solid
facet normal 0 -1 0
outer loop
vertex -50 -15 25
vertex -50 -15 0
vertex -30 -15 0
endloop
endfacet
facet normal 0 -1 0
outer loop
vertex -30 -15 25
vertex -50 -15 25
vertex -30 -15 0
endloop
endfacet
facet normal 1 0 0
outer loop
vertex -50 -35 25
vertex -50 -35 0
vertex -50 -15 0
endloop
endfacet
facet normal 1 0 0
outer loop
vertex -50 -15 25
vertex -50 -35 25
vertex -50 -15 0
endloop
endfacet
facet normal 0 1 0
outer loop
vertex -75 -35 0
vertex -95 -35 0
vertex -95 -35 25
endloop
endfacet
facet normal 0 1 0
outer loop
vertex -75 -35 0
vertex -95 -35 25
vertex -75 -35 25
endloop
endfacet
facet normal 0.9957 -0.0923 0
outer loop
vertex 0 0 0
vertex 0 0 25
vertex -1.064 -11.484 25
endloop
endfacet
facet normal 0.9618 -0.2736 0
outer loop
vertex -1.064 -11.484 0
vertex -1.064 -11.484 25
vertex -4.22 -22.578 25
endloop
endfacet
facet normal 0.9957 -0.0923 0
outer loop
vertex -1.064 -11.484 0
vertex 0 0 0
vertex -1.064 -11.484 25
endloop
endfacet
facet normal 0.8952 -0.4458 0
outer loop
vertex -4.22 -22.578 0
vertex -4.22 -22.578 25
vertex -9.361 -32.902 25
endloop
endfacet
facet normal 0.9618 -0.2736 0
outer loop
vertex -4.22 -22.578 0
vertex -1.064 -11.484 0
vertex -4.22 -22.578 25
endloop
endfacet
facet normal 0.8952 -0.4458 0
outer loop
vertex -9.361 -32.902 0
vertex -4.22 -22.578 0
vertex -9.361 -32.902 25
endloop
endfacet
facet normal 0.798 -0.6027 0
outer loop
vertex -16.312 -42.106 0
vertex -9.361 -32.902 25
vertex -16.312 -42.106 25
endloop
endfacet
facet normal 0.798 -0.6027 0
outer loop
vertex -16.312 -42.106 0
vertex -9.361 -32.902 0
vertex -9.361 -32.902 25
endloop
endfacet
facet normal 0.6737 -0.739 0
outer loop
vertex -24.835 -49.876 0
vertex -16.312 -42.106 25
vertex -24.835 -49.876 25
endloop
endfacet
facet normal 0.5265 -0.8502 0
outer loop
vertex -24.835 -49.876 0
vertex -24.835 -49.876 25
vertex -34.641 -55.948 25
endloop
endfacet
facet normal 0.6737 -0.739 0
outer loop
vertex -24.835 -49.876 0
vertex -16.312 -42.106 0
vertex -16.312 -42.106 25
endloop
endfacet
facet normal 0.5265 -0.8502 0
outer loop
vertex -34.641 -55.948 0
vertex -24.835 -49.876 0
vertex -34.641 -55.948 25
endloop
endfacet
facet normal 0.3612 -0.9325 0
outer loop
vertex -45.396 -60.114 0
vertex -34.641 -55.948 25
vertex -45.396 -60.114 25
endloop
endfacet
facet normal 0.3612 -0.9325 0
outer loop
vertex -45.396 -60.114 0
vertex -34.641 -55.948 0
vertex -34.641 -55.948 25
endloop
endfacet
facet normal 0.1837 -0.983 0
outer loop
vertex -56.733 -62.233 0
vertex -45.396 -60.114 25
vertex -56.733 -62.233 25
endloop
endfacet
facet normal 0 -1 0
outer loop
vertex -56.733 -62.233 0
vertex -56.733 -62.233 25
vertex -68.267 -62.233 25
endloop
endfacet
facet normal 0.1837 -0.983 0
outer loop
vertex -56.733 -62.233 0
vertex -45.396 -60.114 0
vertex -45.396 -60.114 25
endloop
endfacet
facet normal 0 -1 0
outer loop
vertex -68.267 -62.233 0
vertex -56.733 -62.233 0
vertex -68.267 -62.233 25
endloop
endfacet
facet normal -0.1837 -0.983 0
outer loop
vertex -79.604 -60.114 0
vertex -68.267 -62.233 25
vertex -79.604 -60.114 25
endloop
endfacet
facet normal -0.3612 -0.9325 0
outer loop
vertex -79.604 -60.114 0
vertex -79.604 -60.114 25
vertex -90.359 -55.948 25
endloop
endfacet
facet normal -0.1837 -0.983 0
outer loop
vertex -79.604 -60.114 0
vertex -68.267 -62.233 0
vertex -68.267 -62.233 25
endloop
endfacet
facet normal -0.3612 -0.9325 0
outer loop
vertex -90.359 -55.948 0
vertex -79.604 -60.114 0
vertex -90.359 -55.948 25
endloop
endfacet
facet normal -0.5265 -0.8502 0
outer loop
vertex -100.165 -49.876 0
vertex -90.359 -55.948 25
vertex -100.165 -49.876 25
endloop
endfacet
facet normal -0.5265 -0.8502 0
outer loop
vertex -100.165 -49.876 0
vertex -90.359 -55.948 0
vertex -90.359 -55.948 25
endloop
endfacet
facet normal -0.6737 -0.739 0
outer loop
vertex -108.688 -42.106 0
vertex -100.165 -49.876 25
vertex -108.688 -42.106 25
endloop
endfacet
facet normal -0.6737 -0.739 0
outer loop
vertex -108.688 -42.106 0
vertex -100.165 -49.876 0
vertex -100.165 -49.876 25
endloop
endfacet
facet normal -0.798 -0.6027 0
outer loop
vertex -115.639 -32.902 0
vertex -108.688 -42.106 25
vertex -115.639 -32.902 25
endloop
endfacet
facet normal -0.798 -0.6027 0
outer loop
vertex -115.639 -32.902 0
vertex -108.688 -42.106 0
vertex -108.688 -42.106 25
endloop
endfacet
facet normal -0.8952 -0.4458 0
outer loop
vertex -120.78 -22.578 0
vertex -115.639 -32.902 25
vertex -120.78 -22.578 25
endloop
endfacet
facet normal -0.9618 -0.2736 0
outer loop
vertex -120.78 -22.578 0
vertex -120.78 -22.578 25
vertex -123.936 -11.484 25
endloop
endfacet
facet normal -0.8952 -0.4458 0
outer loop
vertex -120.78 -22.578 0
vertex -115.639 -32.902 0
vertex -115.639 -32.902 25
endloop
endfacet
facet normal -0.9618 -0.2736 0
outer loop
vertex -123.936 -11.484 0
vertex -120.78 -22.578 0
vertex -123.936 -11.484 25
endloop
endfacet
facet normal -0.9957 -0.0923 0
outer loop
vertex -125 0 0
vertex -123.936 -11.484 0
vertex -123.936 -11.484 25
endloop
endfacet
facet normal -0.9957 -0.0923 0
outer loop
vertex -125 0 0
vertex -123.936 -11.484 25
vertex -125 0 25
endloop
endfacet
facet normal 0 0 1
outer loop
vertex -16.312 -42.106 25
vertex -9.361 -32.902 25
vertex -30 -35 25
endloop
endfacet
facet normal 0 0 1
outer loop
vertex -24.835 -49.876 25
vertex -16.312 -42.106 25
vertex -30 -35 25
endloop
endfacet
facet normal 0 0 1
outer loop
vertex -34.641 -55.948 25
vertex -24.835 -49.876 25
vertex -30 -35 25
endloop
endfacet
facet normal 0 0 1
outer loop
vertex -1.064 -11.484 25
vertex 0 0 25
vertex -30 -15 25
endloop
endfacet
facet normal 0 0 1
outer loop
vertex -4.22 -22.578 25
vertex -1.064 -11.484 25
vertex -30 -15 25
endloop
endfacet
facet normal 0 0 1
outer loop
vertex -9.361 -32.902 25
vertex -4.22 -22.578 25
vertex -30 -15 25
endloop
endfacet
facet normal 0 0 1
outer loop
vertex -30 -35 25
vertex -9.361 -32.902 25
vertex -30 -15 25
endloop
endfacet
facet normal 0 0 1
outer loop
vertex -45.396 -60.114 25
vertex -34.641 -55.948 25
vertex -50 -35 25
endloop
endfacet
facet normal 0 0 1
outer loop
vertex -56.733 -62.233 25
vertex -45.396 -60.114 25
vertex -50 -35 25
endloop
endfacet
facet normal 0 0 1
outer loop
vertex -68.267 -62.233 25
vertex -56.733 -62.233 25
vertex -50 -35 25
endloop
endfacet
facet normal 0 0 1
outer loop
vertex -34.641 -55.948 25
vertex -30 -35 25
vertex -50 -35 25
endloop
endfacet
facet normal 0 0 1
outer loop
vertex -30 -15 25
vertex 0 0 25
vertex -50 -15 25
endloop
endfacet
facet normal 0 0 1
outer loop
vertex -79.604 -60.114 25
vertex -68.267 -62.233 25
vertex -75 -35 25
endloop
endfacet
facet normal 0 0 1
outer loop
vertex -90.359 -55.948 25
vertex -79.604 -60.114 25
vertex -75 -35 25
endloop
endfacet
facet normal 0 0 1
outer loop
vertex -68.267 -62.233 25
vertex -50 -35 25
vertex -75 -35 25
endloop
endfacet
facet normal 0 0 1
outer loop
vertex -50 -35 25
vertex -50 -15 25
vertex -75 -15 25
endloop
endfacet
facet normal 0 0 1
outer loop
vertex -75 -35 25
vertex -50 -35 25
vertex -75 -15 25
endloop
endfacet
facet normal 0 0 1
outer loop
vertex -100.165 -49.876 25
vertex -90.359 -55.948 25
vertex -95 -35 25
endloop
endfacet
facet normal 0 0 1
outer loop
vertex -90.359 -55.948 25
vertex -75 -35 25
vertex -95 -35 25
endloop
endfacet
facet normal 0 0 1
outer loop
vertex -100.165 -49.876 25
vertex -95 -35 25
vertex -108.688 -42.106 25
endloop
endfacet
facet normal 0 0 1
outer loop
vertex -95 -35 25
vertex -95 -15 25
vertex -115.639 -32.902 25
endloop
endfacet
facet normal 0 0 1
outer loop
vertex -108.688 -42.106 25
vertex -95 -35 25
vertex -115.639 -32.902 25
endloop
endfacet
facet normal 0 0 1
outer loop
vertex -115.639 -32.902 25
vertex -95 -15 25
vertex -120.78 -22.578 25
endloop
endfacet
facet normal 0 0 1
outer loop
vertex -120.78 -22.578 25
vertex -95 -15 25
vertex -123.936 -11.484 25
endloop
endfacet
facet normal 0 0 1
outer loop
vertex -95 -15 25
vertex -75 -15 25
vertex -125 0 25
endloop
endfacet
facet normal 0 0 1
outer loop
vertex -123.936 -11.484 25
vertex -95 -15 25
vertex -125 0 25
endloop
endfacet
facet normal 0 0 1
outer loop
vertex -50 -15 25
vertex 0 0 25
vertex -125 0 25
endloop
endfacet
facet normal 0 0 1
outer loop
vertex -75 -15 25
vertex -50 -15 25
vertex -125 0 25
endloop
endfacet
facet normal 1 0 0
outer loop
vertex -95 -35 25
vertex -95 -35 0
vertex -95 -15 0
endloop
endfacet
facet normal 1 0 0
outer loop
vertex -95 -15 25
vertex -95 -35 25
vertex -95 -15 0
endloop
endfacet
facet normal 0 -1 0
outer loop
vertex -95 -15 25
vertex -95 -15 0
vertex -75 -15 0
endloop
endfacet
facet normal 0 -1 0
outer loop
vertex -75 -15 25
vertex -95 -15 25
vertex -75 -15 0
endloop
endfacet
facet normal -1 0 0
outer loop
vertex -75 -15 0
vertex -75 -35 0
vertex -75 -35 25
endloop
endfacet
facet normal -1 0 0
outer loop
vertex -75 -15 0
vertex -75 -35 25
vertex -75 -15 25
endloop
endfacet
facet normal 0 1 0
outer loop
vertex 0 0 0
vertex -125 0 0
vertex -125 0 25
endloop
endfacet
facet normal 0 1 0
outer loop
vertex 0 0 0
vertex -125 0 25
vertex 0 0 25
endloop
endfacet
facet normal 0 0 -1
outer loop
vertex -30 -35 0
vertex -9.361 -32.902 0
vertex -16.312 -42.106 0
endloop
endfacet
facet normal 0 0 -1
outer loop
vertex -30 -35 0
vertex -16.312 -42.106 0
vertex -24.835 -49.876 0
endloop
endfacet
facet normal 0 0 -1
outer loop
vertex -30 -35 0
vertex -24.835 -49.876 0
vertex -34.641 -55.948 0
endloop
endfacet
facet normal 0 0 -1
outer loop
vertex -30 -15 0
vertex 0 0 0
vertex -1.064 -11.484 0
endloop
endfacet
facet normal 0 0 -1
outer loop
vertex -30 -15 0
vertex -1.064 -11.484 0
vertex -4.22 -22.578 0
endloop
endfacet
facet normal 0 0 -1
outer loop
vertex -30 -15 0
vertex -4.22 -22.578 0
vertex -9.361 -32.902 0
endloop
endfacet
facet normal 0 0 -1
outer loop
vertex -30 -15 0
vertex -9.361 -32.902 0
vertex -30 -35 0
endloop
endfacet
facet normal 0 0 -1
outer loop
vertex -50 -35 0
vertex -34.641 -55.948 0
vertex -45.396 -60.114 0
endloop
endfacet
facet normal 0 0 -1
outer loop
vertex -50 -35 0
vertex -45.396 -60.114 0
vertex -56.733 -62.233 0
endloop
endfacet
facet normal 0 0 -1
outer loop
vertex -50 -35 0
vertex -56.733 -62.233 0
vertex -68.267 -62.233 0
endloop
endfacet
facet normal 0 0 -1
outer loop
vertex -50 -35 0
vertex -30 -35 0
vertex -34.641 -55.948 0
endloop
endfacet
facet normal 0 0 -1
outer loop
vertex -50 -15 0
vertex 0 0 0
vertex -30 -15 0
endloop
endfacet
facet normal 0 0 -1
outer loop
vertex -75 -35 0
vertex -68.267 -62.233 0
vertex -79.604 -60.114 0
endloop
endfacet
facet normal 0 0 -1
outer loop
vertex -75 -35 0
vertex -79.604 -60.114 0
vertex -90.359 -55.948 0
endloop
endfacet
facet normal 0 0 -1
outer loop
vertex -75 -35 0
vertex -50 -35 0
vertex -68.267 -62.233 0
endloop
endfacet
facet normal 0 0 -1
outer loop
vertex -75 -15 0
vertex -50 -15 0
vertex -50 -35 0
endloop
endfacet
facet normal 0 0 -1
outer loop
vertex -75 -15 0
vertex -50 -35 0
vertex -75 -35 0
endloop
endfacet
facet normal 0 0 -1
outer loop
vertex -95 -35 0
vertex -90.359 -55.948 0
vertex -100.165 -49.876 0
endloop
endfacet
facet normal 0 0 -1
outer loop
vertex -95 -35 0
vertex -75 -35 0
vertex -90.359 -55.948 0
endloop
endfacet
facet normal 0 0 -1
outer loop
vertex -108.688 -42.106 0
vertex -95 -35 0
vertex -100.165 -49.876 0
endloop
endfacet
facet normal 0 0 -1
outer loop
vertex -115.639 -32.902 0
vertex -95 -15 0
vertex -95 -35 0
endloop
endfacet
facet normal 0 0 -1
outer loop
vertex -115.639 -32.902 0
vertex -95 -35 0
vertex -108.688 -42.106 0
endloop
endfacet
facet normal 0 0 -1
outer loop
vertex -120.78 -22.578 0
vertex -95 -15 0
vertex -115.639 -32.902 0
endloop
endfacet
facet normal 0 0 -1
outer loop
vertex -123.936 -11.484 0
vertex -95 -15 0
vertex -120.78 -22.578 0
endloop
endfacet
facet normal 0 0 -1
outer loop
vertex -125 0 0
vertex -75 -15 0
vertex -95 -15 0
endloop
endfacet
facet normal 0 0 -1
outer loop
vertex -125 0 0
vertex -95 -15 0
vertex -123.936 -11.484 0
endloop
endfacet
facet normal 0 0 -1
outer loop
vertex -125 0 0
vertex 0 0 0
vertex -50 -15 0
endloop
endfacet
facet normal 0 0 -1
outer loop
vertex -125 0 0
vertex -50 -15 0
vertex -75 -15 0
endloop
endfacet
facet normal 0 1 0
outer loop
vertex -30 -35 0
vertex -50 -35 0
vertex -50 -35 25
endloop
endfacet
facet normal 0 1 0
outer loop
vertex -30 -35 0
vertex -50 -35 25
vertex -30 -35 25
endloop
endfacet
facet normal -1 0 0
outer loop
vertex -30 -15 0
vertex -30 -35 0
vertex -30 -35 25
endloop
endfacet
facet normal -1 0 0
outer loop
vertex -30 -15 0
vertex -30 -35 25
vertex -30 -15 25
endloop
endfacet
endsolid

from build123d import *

# Parameters (mm, degrees)
SKETCH1_W           = 20
SKETCH1_H           = 20
BOSS_EXTRUDE1_DEPTH = 25


with BuildPart() as part:
    # Sketch1 → Boss-Extrude1 (new body)
    with BuildSketch(Plane.XY):
        with BuildLine():
            Line((-125, 0), (0, 0))
            ThreePointArc((0, 0), (-62.5, -62.5), (-125, 0))
        make_face()
        with Locations((-40, -25)):
            Rectangle(SKETCH1_W, SKETCH1_H, mode=Mode.SUBTRACT)
        with Locations((-85, -25)):
            Rectangle(SKETCH1_W, SKETCH1_H, mode=Mode.SUBTRACT)
    extrude(amount=BOSS_EXTRUDE1_DEPTH)


solid = part.part
